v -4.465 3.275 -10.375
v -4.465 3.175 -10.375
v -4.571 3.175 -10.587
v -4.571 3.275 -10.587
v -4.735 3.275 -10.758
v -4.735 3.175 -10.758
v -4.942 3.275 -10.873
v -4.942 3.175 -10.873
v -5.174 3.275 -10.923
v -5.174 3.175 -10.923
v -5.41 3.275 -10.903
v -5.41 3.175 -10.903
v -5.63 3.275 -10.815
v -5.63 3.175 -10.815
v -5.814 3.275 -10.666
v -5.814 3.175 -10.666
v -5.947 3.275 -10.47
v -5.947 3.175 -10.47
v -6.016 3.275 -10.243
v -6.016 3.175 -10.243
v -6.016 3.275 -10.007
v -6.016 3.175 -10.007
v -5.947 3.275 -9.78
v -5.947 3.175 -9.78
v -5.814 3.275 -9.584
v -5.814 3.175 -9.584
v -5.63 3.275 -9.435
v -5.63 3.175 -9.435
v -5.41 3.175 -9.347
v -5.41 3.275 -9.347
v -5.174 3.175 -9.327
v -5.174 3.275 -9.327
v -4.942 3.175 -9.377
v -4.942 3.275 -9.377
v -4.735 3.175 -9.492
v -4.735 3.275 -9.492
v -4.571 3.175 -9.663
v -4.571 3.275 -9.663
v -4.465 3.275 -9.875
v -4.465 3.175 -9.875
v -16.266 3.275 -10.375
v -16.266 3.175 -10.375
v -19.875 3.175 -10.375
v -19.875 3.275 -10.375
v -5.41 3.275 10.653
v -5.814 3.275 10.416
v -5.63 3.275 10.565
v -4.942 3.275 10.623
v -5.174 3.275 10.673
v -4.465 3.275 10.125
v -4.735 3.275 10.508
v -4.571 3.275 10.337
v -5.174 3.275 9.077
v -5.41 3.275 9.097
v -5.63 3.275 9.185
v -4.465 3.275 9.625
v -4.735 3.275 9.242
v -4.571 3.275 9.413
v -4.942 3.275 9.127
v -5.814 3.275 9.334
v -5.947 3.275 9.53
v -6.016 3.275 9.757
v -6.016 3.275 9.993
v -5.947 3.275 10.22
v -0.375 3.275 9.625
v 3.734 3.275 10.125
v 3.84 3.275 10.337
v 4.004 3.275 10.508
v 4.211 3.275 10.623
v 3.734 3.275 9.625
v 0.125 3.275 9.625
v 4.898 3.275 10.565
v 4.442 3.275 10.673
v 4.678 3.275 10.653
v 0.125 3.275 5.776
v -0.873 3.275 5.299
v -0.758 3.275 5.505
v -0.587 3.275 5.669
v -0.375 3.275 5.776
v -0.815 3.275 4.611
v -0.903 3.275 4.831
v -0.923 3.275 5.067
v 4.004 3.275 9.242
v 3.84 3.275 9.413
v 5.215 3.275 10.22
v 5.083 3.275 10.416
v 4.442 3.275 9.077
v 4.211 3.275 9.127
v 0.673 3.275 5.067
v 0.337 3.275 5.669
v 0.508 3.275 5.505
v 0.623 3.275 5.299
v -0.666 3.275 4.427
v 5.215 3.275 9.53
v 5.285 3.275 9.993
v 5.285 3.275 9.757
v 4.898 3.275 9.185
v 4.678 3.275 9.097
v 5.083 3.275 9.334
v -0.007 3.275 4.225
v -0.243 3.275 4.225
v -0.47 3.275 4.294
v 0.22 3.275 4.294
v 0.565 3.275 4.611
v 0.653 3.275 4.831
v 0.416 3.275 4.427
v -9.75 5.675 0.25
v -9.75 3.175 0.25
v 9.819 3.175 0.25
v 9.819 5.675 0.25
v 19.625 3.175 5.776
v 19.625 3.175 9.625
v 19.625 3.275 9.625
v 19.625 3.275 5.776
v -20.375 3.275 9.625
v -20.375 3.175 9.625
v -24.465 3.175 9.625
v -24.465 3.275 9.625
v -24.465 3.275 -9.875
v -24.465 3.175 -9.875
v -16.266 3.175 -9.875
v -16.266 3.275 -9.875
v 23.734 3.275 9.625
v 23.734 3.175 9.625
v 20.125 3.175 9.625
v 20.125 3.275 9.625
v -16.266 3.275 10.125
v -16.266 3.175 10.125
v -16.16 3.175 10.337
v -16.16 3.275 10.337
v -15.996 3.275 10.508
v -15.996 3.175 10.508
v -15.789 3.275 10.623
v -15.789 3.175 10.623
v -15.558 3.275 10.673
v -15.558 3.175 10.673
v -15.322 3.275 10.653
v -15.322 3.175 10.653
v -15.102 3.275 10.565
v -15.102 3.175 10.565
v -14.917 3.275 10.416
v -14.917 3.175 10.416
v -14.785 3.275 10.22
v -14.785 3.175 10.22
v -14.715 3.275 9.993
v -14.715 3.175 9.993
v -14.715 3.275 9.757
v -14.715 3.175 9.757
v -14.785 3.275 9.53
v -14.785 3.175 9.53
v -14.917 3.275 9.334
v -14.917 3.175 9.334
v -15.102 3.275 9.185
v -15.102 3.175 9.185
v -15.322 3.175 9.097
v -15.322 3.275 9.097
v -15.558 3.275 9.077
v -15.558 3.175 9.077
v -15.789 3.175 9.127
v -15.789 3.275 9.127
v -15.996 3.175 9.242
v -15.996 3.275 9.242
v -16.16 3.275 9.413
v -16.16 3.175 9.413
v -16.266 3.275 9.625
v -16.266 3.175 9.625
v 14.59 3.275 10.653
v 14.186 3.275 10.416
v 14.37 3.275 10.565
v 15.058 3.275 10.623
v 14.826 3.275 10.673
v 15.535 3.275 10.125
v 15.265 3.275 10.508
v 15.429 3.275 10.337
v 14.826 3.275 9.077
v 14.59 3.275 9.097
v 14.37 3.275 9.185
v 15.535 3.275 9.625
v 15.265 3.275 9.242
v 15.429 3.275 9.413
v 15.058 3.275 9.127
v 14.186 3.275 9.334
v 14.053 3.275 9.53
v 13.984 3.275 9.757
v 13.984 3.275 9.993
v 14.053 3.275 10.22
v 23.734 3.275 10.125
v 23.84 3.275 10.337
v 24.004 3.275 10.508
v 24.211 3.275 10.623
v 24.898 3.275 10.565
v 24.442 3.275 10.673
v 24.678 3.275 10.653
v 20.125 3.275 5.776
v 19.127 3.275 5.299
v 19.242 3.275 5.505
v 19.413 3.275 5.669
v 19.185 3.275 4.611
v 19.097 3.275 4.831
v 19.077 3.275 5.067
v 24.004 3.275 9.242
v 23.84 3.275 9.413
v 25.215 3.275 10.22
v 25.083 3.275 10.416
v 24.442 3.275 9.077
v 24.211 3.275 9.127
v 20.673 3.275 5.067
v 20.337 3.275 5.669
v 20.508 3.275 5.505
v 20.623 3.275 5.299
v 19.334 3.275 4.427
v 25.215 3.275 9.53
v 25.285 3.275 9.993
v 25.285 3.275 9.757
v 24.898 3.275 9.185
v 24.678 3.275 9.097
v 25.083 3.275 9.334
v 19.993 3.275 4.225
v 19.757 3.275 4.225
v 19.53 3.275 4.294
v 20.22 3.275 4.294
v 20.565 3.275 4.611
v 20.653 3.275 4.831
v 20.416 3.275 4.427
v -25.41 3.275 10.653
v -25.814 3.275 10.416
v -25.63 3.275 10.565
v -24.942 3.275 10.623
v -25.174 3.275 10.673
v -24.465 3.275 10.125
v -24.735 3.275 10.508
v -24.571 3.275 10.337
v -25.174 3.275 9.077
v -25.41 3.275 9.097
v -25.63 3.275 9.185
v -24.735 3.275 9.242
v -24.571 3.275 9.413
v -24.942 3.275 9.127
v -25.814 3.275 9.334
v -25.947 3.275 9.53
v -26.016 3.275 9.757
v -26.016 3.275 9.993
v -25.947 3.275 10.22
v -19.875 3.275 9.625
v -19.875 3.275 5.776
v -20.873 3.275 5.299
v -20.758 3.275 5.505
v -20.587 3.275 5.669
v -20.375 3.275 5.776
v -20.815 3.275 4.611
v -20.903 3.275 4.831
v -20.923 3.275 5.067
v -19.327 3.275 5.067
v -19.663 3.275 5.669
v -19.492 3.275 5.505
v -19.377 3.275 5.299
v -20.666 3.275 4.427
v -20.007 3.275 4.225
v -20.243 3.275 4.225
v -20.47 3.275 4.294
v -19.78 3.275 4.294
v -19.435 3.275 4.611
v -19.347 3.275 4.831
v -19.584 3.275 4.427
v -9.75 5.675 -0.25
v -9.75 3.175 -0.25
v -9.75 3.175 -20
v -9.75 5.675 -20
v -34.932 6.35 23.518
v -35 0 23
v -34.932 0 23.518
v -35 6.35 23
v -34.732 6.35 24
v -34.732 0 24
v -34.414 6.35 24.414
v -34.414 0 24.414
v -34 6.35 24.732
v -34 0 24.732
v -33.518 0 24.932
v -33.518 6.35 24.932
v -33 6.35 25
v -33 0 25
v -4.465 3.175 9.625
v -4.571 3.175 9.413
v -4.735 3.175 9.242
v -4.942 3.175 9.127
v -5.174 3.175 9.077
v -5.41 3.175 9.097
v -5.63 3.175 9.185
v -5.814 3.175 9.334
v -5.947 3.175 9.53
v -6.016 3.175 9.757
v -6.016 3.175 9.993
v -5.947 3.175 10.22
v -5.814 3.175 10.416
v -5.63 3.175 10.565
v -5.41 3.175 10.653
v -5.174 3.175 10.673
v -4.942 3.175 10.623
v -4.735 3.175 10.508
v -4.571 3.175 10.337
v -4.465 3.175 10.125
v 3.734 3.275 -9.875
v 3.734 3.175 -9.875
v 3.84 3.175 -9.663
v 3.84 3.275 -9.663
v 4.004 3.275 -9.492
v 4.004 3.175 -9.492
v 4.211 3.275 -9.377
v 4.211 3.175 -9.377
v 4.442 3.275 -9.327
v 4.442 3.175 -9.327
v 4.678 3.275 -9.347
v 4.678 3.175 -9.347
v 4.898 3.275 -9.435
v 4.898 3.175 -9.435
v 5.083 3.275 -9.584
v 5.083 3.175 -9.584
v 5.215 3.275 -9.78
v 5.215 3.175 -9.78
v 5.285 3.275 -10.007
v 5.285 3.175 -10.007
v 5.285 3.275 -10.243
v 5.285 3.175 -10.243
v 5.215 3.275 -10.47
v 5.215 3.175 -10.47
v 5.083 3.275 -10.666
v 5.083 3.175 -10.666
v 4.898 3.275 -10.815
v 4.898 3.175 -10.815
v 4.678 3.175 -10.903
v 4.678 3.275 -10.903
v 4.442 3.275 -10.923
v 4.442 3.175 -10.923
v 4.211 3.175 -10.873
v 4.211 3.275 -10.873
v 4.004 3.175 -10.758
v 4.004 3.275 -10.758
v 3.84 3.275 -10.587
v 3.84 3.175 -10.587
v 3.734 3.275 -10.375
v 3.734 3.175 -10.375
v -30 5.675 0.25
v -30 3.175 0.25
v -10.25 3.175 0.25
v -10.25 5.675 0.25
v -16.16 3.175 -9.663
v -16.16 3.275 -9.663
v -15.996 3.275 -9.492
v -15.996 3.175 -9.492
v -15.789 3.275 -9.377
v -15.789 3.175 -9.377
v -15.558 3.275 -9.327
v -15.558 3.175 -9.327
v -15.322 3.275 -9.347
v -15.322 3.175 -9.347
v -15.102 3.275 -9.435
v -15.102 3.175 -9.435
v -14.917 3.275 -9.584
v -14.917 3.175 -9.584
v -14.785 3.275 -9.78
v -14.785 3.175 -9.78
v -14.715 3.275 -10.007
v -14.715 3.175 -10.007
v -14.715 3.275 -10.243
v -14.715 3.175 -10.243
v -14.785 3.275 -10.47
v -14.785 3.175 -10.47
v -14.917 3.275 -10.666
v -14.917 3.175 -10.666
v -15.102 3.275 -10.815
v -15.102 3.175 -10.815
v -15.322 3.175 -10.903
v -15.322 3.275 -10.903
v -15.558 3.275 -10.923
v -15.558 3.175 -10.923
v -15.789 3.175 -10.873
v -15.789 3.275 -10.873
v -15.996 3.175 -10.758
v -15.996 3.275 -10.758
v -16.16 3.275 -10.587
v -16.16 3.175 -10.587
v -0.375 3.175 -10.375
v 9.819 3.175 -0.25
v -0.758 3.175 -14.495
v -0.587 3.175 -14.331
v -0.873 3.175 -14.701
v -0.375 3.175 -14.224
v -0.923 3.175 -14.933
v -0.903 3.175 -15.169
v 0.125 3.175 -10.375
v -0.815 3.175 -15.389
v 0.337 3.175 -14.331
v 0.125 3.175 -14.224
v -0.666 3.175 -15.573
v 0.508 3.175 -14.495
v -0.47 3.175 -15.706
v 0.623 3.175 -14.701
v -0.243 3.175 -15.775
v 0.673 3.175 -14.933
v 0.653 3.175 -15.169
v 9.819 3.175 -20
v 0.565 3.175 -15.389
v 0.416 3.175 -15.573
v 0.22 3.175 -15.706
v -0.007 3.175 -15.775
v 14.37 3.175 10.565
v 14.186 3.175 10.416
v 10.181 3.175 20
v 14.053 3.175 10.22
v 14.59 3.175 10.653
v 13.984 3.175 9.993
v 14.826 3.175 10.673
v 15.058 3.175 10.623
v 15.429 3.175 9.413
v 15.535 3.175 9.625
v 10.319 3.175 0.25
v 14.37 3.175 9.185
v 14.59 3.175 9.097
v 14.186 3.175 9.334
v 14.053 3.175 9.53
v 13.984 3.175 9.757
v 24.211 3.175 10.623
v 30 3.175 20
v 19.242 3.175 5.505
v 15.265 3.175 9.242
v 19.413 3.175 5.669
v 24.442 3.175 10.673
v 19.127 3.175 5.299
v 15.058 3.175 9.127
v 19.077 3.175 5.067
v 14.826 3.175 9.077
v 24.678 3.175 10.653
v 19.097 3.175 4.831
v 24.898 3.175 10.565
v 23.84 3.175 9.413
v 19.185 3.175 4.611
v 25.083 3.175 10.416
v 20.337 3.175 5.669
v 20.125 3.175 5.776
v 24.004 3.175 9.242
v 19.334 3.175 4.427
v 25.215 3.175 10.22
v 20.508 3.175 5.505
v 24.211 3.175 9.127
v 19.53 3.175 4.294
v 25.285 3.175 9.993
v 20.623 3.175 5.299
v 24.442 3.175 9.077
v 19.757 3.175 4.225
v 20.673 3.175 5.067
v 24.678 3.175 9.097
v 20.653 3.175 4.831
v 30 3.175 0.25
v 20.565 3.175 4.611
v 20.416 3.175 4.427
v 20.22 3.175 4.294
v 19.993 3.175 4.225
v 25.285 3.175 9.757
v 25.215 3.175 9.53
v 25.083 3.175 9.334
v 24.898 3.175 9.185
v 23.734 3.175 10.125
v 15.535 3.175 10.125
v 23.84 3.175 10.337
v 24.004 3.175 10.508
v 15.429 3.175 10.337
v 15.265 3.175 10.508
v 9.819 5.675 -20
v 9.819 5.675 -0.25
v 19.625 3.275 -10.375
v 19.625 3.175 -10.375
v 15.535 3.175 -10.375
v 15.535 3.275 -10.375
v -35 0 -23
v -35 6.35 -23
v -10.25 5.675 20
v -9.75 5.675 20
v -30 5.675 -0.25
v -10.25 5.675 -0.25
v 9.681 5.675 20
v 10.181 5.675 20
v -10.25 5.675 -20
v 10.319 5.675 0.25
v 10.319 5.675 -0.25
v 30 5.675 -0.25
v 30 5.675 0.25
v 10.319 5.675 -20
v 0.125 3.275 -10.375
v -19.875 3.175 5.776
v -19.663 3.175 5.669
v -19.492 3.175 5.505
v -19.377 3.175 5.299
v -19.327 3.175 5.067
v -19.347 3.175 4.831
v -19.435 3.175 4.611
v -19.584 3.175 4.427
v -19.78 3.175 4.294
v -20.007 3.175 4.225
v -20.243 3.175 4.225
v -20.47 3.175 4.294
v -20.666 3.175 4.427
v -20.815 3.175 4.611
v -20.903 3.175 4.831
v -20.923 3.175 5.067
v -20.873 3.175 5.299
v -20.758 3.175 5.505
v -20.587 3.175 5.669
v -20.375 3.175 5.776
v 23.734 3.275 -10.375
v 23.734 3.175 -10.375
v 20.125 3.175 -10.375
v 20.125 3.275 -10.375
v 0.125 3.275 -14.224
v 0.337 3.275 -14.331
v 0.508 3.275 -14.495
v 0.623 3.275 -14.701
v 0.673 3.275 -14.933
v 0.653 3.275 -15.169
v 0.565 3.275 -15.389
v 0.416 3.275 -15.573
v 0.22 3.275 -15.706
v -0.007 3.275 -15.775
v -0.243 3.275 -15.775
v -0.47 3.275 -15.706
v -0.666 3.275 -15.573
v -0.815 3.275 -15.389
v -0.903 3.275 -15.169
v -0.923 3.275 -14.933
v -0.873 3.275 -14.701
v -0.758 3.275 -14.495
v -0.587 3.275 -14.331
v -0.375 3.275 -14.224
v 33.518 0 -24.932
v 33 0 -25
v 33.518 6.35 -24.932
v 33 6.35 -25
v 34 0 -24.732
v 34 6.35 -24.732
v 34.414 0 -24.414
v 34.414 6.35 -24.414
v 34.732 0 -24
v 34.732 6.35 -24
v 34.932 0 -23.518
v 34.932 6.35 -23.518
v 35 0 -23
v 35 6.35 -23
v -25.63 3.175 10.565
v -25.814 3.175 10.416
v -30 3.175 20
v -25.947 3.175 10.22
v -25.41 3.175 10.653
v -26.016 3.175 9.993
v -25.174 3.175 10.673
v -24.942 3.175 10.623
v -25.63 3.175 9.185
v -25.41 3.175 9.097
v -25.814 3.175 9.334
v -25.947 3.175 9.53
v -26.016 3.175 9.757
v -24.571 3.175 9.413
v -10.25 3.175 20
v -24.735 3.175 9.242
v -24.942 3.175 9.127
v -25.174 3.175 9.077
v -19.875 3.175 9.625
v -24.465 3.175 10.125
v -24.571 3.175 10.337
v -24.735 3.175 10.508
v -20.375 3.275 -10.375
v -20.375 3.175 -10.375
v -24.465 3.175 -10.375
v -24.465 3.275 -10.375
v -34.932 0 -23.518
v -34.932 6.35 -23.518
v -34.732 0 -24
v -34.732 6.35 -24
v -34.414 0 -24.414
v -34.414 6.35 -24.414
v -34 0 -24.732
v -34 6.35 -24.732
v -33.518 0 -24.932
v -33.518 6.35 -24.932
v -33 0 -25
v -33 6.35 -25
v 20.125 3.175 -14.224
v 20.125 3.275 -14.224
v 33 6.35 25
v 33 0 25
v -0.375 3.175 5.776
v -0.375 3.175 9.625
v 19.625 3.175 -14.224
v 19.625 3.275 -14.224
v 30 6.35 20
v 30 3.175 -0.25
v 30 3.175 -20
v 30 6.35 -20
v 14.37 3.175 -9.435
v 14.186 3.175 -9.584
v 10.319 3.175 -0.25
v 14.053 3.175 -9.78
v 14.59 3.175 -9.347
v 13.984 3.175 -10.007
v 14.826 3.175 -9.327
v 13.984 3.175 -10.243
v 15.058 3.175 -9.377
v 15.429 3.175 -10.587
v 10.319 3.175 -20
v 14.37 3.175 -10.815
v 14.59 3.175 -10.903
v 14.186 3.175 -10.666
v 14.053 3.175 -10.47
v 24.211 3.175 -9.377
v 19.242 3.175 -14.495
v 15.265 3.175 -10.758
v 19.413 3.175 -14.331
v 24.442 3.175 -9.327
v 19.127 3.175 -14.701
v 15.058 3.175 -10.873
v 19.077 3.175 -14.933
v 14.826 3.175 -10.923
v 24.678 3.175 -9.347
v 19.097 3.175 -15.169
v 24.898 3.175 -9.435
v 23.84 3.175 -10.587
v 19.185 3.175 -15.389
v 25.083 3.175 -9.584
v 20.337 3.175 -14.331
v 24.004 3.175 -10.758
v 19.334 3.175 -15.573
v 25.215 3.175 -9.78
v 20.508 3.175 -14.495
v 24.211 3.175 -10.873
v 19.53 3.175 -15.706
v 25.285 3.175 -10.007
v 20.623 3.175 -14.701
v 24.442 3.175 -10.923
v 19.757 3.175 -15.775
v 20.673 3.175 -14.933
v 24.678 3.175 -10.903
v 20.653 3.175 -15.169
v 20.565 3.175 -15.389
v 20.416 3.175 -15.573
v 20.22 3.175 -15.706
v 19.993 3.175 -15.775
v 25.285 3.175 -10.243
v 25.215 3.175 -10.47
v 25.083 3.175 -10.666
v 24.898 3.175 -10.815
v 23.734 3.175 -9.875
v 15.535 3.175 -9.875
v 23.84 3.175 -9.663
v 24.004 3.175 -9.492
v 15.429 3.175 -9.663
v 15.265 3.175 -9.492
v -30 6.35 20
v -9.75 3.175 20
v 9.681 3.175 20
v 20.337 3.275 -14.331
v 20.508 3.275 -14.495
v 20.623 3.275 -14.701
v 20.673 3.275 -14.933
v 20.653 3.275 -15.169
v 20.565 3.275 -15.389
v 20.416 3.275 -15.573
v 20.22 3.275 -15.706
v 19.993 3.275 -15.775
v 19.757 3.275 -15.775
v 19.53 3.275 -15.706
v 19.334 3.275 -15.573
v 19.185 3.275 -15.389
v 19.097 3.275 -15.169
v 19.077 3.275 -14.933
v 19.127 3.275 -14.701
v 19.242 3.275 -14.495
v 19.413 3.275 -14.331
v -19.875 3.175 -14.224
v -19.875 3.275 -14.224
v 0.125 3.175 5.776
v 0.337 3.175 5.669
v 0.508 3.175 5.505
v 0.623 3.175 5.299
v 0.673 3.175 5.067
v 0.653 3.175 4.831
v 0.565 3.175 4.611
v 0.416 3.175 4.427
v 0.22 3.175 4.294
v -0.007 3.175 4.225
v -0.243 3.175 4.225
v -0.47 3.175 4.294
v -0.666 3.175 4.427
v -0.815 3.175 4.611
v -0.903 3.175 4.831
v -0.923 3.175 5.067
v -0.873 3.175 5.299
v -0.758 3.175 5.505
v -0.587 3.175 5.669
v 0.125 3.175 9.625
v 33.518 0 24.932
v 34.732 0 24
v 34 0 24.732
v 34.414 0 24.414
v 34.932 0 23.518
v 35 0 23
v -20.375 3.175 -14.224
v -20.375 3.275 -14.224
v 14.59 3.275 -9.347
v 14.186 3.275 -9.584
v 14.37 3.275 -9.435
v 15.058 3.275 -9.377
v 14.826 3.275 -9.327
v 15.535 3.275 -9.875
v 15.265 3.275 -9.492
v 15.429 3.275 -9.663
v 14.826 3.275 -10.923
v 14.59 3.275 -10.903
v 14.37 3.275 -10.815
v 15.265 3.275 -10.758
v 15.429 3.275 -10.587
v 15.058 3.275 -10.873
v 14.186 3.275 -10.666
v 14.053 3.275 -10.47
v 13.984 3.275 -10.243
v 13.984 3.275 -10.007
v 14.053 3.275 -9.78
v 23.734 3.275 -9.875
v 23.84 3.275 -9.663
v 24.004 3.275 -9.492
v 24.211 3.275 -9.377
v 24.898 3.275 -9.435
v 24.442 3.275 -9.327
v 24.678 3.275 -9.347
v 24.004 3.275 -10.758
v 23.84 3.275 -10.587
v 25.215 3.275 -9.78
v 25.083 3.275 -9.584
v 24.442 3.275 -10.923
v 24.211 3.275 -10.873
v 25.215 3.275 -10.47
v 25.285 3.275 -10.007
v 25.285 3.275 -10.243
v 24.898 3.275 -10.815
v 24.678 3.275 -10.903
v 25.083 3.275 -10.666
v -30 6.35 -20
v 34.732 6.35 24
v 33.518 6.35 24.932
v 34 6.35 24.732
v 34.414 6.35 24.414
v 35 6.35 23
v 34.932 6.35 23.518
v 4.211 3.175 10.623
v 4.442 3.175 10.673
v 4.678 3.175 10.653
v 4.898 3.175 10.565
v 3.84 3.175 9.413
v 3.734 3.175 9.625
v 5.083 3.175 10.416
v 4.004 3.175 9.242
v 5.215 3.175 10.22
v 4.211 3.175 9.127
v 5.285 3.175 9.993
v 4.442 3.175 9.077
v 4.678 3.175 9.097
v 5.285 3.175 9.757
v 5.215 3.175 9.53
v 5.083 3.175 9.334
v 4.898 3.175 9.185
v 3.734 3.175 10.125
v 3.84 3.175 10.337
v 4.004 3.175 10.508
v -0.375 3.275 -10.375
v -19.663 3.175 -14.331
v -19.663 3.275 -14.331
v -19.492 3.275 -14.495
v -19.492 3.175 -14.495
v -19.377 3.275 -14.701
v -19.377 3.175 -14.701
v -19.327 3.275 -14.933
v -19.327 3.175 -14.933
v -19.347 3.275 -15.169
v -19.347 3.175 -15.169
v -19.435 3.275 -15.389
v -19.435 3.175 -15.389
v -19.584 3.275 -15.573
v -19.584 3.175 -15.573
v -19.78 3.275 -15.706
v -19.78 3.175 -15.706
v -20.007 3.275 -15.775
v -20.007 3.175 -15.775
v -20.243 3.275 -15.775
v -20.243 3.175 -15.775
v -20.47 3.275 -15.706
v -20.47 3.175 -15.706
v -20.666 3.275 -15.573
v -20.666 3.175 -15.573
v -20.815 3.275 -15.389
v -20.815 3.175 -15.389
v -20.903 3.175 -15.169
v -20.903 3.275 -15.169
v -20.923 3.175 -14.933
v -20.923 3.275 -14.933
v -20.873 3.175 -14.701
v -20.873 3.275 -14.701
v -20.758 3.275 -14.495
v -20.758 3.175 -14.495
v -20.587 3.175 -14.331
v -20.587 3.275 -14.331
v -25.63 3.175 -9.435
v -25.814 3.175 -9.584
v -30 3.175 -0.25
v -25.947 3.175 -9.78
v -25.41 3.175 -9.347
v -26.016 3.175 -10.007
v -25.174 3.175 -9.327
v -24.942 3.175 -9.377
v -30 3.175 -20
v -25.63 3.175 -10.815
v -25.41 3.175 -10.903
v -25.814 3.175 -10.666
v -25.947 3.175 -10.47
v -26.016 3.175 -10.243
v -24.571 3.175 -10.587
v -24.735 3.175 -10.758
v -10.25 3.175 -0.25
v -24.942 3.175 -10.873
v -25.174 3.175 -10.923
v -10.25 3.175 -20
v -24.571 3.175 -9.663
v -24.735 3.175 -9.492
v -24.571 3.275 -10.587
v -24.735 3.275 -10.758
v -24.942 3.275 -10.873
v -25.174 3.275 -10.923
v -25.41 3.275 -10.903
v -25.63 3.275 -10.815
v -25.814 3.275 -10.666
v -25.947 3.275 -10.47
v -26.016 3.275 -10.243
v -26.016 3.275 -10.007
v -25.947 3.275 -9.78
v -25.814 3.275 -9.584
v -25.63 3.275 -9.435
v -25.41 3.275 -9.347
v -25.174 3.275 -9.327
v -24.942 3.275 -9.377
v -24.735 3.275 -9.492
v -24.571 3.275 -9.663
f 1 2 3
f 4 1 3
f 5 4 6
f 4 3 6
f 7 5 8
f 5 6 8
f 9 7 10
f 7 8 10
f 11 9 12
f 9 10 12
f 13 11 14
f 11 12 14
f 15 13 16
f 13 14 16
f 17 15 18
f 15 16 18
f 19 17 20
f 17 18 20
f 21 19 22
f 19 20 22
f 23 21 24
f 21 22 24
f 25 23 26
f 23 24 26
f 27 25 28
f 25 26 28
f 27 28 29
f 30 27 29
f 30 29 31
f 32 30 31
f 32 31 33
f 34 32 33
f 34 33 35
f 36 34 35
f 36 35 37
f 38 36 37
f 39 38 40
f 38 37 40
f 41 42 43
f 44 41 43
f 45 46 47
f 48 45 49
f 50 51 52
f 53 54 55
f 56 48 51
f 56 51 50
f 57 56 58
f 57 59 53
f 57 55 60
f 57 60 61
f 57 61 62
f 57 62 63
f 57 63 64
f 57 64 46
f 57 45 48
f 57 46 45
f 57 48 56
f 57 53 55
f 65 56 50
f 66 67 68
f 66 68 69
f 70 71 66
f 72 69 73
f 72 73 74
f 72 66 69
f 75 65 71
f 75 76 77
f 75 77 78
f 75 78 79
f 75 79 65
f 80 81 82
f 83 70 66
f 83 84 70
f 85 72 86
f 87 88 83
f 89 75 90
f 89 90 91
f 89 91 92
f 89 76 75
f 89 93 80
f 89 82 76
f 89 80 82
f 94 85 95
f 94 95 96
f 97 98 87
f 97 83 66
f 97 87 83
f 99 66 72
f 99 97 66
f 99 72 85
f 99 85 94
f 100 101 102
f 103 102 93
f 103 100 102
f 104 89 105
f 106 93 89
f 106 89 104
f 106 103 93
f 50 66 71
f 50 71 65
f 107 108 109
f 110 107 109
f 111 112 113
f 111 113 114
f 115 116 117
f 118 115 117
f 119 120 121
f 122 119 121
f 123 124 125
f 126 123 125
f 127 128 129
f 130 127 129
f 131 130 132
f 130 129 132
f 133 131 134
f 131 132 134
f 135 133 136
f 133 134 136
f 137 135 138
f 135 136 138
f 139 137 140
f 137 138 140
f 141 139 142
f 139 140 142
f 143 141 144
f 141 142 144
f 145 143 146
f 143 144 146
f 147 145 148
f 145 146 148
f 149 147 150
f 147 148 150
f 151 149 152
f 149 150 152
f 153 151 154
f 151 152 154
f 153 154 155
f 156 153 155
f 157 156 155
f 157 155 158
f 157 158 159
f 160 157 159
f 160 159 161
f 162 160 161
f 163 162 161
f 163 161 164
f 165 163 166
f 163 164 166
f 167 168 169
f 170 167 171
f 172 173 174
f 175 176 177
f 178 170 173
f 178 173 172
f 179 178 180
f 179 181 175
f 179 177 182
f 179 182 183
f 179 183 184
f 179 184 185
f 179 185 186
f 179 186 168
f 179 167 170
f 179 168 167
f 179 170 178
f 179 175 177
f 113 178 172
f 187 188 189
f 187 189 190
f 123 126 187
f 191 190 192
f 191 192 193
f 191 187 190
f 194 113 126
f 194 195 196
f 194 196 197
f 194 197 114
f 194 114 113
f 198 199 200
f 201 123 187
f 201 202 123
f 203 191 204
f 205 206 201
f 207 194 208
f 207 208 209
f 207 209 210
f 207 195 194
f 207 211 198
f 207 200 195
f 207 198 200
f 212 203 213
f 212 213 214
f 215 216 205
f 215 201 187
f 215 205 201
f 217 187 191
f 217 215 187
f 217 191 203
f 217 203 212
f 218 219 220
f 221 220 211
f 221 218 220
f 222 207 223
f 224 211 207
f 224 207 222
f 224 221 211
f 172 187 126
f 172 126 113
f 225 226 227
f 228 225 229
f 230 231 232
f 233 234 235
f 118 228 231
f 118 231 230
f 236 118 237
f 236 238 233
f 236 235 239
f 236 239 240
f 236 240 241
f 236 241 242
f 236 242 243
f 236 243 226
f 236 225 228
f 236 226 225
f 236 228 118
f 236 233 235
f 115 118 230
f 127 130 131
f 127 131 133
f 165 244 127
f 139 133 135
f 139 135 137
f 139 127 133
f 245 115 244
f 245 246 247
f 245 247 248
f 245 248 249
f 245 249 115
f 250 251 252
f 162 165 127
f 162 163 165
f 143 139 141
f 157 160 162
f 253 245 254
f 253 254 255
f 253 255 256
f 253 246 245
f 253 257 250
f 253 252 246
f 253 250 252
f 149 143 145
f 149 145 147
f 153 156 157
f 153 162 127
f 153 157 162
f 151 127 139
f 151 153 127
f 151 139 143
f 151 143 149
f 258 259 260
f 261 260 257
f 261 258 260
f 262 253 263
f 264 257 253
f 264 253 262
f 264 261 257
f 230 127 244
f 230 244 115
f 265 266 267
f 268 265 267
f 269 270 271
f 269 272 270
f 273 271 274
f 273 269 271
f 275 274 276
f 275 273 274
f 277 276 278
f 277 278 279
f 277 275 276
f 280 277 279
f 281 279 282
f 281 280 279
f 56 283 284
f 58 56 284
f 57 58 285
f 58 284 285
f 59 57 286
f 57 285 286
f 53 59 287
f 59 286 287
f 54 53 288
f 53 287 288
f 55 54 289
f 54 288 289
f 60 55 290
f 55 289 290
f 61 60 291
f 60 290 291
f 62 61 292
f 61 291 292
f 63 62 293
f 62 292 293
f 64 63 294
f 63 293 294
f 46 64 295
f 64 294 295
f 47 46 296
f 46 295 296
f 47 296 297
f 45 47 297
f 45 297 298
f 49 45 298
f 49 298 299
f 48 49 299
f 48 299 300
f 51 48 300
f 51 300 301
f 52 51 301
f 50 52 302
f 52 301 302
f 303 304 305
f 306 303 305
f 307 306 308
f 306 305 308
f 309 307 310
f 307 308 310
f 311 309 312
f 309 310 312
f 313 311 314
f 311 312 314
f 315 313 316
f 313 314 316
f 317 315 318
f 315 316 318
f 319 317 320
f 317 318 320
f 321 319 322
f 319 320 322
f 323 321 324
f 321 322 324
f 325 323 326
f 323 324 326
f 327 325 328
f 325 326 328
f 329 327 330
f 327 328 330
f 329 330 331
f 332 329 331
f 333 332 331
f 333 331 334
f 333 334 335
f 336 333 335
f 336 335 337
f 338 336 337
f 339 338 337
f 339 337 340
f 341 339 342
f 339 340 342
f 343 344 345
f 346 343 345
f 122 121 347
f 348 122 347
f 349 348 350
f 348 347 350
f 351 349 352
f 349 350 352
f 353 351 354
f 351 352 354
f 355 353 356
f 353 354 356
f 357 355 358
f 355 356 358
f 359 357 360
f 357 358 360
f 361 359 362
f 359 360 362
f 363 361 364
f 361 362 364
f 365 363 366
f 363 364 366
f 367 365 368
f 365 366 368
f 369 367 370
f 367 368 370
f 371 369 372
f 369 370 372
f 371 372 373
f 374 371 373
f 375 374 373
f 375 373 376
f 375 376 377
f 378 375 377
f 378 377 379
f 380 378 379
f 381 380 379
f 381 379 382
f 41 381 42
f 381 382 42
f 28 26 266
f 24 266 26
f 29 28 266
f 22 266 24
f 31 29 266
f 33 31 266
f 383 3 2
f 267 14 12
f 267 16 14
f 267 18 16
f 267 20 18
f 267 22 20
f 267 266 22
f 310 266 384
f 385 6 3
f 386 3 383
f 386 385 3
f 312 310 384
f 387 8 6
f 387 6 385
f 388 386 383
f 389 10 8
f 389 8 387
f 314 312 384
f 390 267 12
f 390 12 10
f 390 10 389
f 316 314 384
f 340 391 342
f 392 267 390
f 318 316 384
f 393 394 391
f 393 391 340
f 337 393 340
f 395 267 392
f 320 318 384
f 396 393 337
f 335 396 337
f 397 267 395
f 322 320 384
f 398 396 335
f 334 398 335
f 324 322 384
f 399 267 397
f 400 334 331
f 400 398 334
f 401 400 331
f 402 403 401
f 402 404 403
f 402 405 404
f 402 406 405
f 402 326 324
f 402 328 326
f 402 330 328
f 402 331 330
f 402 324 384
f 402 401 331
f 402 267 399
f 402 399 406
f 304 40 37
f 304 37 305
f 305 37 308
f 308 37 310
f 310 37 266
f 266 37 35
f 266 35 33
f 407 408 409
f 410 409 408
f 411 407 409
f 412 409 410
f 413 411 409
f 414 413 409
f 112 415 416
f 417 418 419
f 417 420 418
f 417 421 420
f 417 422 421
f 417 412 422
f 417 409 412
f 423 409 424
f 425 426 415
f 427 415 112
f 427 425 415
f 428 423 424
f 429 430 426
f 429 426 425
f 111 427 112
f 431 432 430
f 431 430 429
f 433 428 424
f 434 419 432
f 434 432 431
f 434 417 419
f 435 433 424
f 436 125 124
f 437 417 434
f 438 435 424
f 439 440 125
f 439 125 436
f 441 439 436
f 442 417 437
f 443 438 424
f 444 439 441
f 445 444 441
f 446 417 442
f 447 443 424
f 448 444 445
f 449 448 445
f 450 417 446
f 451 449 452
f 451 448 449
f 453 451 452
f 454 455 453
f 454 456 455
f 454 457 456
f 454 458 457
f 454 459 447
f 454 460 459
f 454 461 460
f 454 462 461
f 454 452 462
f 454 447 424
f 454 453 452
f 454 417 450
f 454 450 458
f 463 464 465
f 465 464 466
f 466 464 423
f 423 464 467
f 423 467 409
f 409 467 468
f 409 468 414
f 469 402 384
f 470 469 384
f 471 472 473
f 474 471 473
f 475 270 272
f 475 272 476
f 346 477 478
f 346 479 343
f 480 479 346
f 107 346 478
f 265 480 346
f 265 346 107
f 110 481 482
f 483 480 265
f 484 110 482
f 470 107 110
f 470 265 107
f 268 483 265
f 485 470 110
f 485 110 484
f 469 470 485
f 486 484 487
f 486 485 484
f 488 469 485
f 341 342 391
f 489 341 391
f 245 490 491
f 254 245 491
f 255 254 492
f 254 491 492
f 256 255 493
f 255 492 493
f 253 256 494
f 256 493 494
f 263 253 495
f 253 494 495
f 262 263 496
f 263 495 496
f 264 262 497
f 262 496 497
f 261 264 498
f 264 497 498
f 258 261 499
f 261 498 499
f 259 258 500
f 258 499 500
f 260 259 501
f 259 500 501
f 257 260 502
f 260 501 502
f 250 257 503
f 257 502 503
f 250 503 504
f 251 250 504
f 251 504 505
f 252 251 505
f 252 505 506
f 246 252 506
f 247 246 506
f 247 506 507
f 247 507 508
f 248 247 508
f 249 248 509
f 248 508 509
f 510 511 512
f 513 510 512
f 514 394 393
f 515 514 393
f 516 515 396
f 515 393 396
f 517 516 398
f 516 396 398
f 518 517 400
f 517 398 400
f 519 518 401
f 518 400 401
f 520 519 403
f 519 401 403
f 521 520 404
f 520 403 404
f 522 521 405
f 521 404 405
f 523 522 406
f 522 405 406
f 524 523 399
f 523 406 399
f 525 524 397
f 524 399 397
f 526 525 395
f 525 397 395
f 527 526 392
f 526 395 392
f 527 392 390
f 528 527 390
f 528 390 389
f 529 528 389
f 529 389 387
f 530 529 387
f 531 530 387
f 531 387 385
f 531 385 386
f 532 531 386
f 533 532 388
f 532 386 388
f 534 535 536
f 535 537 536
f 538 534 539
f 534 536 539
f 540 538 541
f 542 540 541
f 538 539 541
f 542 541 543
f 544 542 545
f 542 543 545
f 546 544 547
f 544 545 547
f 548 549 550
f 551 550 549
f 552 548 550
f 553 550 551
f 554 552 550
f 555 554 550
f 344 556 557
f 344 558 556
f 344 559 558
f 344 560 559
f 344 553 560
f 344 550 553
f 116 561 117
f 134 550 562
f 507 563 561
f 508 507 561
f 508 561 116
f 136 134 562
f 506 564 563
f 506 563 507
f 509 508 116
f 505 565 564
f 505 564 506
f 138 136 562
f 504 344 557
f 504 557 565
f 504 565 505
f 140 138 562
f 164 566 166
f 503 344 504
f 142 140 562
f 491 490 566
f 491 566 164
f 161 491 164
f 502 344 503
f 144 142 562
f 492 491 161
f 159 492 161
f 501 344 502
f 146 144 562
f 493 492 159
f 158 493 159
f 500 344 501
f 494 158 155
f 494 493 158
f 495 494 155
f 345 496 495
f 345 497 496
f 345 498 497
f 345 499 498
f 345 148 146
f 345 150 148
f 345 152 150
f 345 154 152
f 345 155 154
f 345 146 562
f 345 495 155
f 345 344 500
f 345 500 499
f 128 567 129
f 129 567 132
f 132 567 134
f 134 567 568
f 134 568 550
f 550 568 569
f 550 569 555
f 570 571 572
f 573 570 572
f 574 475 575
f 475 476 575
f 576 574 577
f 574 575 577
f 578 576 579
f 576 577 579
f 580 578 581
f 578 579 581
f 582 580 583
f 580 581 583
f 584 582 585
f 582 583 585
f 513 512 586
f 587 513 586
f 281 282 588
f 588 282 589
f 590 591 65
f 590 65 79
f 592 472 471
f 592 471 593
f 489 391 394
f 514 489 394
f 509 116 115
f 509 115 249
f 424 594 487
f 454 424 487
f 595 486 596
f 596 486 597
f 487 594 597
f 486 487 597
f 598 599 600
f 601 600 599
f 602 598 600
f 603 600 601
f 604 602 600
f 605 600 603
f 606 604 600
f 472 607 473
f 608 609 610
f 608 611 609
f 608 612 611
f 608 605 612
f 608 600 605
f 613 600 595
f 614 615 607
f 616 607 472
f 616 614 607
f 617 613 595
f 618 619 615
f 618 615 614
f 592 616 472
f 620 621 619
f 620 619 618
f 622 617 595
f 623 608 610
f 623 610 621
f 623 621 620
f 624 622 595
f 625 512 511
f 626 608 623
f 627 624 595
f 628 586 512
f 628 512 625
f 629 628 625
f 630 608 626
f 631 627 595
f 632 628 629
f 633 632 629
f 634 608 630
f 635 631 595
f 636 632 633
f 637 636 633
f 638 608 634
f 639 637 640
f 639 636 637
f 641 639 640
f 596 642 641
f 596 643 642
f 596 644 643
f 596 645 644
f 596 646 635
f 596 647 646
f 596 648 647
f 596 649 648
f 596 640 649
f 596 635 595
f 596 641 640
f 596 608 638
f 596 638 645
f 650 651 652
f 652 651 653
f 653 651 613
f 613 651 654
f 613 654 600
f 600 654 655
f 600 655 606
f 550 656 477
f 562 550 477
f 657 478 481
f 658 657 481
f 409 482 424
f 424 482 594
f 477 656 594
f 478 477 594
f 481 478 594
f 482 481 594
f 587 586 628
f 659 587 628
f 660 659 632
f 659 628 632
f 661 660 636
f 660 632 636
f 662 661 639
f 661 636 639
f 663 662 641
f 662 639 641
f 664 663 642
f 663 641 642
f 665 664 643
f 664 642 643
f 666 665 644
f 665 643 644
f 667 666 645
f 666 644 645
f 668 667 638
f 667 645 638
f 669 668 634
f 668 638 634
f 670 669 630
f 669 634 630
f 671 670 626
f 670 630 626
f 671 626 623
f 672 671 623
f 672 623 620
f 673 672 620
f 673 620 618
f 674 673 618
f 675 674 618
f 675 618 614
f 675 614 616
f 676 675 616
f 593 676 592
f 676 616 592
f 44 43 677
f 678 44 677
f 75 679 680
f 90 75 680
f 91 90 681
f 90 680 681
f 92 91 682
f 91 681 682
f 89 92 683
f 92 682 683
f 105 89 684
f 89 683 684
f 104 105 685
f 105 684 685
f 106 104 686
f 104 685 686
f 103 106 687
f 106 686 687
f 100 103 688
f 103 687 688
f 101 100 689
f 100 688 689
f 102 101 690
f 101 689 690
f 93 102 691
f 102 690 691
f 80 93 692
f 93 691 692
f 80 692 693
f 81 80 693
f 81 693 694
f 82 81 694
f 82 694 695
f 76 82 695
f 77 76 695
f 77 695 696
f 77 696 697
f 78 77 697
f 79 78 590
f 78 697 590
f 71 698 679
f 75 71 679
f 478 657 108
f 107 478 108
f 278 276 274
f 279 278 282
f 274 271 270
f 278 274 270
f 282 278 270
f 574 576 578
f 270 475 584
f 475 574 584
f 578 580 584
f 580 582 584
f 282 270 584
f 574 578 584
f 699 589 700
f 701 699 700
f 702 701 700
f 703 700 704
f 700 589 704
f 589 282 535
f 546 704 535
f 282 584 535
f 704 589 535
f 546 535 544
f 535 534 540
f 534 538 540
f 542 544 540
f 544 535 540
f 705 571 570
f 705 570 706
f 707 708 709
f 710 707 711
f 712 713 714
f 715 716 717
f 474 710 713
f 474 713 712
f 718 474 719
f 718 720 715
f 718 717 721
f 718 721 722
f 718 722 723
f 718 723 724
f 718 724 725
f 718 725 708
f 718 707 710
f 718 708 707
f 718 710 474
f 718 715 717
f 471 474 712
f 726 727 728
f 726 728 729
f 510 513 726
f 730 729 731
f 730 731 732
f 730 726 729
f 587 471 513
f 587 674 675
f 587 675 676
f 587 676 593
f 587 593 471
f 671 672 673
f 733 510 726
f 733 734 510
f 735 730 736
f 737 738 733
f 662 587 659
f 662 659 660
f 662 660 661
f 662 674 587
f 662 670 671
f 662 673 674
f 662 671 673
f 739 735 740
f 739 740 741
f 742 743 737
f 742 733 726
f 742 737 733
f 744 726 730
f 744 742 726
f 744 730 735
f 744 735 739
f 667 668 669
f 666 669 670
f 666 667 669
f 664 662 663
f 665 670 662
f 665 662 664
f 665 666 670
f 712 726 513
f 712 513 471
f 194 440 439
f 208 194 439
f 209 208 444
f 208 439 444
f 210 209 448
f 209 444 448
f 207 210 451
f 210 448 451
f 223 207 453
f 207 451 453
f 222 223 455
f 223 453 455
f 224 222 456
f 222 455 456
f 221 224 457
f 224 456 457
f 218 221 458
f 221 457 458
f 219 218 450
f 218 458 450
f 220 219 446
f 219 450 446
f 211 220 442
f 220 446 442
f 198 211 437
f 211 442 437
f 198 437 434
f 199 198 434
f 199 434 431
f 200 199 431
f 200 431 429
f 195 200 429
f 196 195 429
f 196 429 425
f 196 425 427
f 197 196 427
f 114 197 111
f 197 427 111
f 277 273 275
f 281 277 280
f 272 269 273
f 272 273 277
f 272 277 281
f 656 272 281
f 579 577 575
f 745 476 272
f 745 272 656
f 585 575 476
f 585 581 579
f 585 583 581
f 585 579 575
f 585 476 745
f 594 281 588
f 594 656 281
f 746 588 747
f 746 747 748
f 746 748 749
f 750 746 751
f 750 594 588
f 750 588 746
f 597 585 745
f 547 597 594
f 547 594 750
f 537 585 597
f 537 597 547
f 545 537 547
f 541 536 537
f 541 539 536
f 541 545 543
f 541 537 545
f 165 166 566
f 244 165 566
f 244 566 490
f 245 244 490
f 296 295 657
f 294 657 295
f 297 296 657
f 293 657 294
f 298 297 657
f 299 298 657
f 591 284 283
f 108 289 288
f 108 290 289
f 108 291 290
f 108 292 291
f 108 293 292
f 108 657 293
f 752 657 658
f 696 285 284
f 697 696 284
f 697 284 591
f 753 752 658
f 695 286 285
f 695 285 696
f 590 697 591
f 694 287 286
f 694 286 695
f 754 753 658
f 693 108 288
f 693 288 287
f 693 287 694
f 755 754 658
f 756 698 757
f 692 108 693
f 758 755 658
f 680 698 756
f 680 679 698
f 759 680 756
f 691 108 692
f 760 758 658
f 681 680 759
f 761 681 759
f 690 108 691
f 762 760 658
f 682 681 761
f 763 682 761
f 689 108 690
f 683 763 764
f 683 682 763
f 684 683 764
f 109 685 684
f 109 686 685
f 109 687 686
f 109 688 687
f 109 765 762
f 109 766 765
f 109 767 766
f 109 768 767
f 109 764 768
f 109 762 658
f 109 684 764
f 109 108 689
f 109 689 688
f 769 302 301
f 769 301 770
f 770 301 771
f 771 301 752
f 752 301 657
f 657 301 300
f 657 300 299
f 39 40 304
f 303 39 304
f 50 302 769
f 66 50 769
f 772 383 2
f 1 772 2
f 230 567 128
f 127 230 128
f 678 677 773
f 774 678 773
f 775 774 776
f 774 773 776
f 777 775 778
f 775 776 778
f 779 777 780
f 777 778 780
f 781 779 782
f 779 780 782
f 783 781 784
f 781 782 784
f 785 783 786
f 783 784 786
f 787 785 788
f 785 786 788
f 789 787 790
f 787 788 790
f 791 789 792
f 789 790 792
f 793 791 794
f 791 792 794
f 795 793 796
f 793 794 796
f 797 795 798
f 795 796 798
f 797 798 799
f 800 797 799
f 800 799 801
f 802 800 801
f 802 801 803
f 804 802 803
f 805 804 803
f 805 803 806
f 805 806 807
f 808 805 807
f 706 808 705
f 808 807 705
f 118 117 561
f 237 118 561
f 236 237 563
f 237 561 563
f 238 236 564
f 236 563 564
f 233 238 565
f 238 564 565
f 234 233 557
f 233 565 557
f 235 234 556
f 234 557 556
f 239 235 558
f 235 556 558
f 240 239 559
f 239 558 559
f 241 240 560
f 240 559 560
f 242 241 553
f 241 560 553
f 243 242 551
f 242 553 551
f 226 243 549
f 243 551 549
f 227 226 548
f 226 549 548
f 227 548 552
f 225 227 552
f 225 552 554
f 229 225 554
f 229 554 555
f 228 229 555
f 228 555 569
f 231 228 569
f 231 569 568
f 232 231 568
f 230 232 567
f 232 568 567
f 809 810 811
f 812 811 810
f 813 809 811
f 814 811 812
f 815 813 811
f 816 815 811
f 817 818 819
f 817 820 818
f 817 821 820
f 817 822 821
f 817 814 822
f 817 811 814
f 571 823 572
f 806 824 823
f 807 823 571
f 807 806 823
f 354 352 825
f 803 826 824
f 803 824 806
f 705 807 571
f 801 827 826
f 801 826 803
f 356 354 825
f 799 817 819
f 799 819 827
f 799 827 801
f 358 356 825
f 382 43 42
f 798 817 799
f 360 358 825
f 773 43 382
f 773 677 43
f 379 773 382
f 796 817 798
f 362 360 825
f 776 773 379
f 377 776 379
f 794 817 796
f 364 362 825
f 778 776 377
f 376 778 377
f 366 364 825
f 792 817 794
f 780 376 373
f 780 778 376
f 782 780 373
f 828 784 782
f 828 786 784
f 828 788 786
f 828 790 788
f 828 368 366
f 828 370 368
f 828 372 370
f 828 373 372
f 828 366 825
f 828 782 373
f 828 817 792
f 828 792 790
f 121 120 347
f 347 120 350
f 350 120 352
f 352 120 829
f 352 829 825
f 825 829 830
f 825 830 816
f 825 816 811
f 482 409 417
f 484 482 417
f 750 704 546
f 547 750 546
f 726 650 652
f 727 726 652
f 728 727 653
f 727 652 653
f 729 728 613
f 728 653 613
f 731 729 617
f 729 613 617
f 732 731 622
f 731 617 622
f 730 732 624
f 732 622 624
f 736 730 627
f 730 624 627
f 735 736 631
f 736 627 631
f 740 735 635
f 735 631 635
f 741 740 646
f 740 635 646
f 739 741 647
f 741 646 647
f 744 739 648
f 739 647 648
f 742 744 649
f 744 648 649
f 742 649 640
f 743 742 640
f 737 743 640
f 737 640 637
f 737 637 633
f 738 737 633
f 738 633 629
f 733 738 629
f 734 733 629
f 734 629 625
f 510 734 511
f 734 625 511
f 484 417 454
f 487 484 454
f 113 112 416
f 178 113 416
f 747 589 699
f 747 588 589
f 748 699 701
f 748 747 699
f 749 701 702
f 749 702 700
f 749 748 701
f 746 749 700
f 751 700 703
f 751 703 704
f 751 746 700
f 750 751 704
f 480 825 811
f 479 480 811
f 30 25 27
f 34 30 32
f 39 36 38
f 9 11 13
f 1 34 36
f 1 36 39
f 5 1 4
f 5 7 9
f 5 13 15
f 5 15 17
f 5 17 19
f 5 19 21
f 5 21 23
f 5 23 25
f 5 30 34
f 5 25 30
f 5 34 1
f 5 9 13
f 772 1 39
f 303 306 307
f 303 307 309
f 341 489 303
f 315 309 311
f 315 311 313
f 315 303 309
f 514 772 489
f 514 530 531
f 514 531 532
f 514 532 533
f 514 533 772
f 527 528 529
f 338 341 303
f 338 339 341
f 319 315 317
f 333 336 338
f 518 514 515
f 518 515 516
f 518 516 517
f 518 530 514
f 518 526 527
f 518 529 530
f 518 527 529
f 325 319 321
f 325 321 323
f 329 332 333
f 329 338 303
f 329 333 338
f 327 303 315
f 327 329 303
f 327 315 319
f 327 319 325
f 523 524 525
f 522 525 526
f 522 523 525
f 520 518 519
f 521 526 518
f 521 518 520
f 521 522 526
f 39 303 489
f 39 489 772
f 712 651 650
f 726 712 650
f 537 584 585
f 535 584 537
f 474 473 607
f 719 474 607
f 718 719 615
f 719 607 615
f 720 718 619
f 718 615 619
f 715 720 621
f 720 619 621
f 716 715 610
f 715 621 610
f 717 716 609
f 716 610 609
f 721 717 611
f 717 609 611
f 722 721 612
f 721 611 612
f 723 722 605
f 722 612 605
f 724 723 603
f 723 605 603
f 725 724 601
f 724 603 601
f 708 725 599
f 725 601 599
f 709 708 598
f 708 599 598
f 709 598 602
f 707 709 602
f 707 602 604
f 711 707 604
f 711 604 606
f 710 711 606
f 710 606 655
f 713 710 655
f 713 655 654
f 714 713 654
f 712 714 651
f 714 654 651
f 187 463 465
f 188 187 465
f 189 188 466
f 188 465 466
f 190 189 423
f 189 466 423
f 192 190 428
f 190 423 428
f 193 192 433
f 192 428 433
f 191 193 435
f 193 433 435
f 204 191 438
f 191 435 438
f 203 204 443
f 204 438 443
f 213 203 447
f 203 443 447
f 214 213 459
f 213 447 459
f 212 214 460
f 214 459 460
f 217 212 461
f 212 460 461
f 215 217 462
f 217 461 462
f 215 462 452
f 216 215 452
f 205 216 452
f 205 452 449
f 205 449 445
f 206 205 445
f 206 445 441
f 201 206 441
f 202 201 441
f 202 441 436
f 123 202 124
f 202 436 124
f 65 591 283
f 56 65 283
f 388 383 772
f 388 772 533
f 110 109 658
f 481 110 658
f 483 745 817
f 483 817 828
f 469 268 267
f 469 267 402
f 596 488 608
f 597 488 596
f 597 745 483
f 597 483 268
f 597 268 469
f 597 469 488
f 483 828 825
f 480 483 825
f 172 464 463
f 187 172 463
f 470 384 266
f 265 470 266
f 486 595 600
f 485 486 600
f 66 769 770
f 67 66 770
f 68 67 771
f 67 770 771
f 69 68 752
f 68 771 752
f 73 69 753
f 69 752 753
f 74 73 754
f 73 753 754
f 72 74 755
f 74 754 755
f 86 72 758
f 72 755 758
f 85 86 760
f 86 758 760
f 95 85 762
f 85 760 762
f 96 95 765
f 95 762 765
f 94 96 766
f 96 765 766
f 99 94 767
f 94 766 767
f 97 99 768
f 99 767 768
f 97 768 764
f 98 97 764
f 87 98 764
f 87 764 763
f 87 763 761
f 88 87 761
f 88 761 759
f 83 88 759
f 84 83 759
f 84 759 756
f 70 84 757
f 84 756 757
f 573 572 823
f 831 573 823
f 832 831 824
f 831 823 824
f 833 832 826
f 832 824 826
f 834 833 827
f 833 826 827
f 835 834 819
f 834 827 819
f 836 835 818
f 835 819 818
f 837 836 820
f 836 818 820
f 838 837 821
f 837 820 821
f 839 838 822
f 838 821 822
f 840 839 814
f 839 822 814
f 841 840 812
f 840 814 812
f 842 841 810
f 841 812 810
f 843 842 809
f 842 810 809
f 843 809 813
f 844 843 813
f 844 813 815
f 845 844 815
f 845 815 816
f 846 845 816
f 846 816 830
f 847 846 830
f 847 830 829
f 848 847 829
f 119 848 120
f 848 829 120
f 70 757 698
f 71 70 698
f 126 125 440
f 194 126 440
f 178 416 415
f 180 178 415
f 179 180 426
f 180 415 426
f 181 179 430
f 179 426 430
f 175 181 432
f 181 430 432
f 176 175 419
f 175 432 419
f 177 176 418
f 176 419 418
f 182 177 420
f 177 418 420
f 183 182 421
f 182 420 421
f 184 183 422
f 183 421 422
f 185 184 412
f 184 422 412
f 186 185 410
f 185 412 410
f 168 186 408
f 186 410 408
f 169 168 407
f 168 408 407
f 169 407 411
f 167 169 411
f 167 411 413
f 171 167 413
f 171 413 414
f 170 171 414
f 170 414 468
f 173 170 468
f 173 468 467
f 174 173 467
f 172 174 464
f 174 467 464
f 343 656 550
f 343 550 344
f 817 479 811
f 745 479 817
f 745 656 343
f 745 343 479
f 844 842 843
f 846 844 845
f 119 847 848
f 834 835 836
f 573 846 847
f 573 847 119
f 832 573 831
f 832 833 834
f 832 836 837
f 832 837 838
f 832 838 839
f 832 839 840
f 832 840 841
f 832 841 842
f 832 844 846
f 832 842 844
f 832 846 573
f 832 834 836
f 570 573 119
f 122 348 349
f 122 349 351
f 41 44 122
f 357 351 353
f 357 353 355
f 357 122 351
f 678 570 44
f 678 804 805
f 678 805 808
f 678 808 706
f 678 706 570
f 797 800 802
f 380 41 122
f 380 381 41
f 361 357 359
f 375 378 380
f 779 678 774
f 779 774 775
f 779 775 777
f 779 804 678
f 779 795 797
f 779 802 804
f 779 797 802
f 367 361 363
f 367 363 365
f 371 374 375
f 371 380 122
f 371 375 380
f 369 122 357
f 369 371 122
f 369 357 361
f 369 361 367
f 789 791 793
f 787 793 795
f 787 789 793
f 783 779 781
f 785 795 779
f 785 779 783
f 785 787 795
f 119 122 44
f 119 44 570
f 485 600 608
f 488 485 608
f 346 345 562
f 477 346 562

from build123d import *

# Parameters (mm, degrees)
SKETCH1_W            = 70
SKETCH1_H            = 50
BOSS_EXTRUDE1_DEPTH  = 6.35
SKETCH2_W            = 60
SKETCH2_H            = 40
CUT_EXTRUDE1_DEPTH   = 3.175
DIVIDERS_DEPTH       = 2.5
SKETCH11_W           = 0.5
SKETCH11_H           = 0.5
SKETCH11_W_2         = 4.089905709
SKETCH11_W_3         = 3.608523714
SKETCH11_H_2         = 3.849214712
BOSS_EXTRUDE3_DEPTH  = 0.1
LPATTERN1_COUNT      = 3
LPATTERN1_PITCH      = 20
LPATTERN1_COUNT_DIR2 = 2
LPATTERN1_PITCH_DIR2 = 20
FILLET1_R            = 2


with BuildPart() as part:
    # Sketch1 → Boss-Extrude1 (new body)
    with BuildSketch(Plane(origin=(0, 0, 0), x_dir=(1, 0, 0), z_dir=(0, 1, 0))):
        Rectangle(SKETCH1_W, SKETCH1_H)
    extrude(amount=BOSS_EXTRUDE1_DEPTH)

    # Sketch2 → Cut-Extrude1 (cut)
    with BuildSketch(Plane(origin=(0, 6.35, 0), x_dir=(1, 0, 0), z_dir=(0, 1, 0))):
        Rectangle(SKETCH2_W, SKETCH2_H)
    extrude(amount=-CUT_EXTRUDE1_DEPTH, mode=Mode.SUBTRACT)

    # Sketch10 → Dividers (add)
    with BuildSketch(Plane(origin=(0, 3.175, 0), x_dir=(1, 0, 0), z_dir=(0, 1, 0))):
        Polygon((-10.25, -0.25), (-10.25, -20), (-9.75, -20), (-9.75, -0.25), (9.818560524, -0.25), (9.681439476, -20), (10.181439476, -20), (10.318560524, -0.25), (30, -0.25), (30, 0.25), (10.318560524, 0.25), (10.318560524, 20), (9.818560524, 20), (9.818560524, 0.25), (-9.75, 0.25), (-9.75, 20), (-10.25, 20), (-10.25, 0.25), (-30, 0.25), (-30, -0.25), align=None)
    extrude(amount=DIVIDERS_DEPTH)

    # Sketch11 → Boss-Extrude3 (add)
    with BuildSketch(Plane(origin=(0, 3.175, 0), x_dir=(1, 0, 0), z_dir=(0, 1, 0))):
        with Locations((-20.125, 10.125)):
            Rectangle(SKETCH11_W, SKETCH11_H)
        with Locations((-22.419952854, 10.125)):
            Rectangle(SKETCH11_W_2, SKETCH11_H)
        with Locations((-18.070738143, 10.125)):
            Rectangle(SKETCH11_W_3, SKETCH11_H)
        with BuildLine():
            ThreePointArc((-24.464905709, 10.375), (-26.024839917, 10.125), (-24.464905709, 9.875))
            Line((-24.464905709, 9.875), (-24.464905709, 10.375))
        make_face()
        with Locations((-20.125, 12.299607356)):
            Rectangle(SKETCH11_W, SKETCH11_H_2)
        with BuildLine():
            Line((-16.266476286, 10.375), (-16.266476286, 9.875))
            ThreePointArc((-16.266476286, 9.875), (-14.706542078, 10.125), (-16.266476286, 10.375))
        make_face()
        with BuildLine():
            ThreePointArc((-19.875, 14.224214712), (-20.125, 15.784148919), (-20.375, 14.224214712))
            Line((-20.375, 14.224214712), (-19.875, 14.224214712))
        make_face()
    boss_extrude3 = extrude(amount=BOSS_EXTRUDE3_DEPTH)

    # LPattern1: Boss-Extrude3 3 × 2
    with Locations(*[(i * LPATTERN1_PITCH, 0, j * LPATTERN1_PITCH_DIR2) for i in range(LPATTERN1_COUNT) for j in range(LPATTERN1_COUNT_DIR2) if (i, j) != (0, 0)]):
        add(boss_extrude3)

    # Fillet1
    fillet1_edges = [part.edges().sort_by_distance(p)[0] for p in [
        (35, 3.175, 25),
        (-35, 3.175, 25),
        (-35, 3.175, -25),
        (35, 3.175, -25),
    ]]
    fillet(fillet1_edges, radius=FILLET1_R)


solid = part.part
